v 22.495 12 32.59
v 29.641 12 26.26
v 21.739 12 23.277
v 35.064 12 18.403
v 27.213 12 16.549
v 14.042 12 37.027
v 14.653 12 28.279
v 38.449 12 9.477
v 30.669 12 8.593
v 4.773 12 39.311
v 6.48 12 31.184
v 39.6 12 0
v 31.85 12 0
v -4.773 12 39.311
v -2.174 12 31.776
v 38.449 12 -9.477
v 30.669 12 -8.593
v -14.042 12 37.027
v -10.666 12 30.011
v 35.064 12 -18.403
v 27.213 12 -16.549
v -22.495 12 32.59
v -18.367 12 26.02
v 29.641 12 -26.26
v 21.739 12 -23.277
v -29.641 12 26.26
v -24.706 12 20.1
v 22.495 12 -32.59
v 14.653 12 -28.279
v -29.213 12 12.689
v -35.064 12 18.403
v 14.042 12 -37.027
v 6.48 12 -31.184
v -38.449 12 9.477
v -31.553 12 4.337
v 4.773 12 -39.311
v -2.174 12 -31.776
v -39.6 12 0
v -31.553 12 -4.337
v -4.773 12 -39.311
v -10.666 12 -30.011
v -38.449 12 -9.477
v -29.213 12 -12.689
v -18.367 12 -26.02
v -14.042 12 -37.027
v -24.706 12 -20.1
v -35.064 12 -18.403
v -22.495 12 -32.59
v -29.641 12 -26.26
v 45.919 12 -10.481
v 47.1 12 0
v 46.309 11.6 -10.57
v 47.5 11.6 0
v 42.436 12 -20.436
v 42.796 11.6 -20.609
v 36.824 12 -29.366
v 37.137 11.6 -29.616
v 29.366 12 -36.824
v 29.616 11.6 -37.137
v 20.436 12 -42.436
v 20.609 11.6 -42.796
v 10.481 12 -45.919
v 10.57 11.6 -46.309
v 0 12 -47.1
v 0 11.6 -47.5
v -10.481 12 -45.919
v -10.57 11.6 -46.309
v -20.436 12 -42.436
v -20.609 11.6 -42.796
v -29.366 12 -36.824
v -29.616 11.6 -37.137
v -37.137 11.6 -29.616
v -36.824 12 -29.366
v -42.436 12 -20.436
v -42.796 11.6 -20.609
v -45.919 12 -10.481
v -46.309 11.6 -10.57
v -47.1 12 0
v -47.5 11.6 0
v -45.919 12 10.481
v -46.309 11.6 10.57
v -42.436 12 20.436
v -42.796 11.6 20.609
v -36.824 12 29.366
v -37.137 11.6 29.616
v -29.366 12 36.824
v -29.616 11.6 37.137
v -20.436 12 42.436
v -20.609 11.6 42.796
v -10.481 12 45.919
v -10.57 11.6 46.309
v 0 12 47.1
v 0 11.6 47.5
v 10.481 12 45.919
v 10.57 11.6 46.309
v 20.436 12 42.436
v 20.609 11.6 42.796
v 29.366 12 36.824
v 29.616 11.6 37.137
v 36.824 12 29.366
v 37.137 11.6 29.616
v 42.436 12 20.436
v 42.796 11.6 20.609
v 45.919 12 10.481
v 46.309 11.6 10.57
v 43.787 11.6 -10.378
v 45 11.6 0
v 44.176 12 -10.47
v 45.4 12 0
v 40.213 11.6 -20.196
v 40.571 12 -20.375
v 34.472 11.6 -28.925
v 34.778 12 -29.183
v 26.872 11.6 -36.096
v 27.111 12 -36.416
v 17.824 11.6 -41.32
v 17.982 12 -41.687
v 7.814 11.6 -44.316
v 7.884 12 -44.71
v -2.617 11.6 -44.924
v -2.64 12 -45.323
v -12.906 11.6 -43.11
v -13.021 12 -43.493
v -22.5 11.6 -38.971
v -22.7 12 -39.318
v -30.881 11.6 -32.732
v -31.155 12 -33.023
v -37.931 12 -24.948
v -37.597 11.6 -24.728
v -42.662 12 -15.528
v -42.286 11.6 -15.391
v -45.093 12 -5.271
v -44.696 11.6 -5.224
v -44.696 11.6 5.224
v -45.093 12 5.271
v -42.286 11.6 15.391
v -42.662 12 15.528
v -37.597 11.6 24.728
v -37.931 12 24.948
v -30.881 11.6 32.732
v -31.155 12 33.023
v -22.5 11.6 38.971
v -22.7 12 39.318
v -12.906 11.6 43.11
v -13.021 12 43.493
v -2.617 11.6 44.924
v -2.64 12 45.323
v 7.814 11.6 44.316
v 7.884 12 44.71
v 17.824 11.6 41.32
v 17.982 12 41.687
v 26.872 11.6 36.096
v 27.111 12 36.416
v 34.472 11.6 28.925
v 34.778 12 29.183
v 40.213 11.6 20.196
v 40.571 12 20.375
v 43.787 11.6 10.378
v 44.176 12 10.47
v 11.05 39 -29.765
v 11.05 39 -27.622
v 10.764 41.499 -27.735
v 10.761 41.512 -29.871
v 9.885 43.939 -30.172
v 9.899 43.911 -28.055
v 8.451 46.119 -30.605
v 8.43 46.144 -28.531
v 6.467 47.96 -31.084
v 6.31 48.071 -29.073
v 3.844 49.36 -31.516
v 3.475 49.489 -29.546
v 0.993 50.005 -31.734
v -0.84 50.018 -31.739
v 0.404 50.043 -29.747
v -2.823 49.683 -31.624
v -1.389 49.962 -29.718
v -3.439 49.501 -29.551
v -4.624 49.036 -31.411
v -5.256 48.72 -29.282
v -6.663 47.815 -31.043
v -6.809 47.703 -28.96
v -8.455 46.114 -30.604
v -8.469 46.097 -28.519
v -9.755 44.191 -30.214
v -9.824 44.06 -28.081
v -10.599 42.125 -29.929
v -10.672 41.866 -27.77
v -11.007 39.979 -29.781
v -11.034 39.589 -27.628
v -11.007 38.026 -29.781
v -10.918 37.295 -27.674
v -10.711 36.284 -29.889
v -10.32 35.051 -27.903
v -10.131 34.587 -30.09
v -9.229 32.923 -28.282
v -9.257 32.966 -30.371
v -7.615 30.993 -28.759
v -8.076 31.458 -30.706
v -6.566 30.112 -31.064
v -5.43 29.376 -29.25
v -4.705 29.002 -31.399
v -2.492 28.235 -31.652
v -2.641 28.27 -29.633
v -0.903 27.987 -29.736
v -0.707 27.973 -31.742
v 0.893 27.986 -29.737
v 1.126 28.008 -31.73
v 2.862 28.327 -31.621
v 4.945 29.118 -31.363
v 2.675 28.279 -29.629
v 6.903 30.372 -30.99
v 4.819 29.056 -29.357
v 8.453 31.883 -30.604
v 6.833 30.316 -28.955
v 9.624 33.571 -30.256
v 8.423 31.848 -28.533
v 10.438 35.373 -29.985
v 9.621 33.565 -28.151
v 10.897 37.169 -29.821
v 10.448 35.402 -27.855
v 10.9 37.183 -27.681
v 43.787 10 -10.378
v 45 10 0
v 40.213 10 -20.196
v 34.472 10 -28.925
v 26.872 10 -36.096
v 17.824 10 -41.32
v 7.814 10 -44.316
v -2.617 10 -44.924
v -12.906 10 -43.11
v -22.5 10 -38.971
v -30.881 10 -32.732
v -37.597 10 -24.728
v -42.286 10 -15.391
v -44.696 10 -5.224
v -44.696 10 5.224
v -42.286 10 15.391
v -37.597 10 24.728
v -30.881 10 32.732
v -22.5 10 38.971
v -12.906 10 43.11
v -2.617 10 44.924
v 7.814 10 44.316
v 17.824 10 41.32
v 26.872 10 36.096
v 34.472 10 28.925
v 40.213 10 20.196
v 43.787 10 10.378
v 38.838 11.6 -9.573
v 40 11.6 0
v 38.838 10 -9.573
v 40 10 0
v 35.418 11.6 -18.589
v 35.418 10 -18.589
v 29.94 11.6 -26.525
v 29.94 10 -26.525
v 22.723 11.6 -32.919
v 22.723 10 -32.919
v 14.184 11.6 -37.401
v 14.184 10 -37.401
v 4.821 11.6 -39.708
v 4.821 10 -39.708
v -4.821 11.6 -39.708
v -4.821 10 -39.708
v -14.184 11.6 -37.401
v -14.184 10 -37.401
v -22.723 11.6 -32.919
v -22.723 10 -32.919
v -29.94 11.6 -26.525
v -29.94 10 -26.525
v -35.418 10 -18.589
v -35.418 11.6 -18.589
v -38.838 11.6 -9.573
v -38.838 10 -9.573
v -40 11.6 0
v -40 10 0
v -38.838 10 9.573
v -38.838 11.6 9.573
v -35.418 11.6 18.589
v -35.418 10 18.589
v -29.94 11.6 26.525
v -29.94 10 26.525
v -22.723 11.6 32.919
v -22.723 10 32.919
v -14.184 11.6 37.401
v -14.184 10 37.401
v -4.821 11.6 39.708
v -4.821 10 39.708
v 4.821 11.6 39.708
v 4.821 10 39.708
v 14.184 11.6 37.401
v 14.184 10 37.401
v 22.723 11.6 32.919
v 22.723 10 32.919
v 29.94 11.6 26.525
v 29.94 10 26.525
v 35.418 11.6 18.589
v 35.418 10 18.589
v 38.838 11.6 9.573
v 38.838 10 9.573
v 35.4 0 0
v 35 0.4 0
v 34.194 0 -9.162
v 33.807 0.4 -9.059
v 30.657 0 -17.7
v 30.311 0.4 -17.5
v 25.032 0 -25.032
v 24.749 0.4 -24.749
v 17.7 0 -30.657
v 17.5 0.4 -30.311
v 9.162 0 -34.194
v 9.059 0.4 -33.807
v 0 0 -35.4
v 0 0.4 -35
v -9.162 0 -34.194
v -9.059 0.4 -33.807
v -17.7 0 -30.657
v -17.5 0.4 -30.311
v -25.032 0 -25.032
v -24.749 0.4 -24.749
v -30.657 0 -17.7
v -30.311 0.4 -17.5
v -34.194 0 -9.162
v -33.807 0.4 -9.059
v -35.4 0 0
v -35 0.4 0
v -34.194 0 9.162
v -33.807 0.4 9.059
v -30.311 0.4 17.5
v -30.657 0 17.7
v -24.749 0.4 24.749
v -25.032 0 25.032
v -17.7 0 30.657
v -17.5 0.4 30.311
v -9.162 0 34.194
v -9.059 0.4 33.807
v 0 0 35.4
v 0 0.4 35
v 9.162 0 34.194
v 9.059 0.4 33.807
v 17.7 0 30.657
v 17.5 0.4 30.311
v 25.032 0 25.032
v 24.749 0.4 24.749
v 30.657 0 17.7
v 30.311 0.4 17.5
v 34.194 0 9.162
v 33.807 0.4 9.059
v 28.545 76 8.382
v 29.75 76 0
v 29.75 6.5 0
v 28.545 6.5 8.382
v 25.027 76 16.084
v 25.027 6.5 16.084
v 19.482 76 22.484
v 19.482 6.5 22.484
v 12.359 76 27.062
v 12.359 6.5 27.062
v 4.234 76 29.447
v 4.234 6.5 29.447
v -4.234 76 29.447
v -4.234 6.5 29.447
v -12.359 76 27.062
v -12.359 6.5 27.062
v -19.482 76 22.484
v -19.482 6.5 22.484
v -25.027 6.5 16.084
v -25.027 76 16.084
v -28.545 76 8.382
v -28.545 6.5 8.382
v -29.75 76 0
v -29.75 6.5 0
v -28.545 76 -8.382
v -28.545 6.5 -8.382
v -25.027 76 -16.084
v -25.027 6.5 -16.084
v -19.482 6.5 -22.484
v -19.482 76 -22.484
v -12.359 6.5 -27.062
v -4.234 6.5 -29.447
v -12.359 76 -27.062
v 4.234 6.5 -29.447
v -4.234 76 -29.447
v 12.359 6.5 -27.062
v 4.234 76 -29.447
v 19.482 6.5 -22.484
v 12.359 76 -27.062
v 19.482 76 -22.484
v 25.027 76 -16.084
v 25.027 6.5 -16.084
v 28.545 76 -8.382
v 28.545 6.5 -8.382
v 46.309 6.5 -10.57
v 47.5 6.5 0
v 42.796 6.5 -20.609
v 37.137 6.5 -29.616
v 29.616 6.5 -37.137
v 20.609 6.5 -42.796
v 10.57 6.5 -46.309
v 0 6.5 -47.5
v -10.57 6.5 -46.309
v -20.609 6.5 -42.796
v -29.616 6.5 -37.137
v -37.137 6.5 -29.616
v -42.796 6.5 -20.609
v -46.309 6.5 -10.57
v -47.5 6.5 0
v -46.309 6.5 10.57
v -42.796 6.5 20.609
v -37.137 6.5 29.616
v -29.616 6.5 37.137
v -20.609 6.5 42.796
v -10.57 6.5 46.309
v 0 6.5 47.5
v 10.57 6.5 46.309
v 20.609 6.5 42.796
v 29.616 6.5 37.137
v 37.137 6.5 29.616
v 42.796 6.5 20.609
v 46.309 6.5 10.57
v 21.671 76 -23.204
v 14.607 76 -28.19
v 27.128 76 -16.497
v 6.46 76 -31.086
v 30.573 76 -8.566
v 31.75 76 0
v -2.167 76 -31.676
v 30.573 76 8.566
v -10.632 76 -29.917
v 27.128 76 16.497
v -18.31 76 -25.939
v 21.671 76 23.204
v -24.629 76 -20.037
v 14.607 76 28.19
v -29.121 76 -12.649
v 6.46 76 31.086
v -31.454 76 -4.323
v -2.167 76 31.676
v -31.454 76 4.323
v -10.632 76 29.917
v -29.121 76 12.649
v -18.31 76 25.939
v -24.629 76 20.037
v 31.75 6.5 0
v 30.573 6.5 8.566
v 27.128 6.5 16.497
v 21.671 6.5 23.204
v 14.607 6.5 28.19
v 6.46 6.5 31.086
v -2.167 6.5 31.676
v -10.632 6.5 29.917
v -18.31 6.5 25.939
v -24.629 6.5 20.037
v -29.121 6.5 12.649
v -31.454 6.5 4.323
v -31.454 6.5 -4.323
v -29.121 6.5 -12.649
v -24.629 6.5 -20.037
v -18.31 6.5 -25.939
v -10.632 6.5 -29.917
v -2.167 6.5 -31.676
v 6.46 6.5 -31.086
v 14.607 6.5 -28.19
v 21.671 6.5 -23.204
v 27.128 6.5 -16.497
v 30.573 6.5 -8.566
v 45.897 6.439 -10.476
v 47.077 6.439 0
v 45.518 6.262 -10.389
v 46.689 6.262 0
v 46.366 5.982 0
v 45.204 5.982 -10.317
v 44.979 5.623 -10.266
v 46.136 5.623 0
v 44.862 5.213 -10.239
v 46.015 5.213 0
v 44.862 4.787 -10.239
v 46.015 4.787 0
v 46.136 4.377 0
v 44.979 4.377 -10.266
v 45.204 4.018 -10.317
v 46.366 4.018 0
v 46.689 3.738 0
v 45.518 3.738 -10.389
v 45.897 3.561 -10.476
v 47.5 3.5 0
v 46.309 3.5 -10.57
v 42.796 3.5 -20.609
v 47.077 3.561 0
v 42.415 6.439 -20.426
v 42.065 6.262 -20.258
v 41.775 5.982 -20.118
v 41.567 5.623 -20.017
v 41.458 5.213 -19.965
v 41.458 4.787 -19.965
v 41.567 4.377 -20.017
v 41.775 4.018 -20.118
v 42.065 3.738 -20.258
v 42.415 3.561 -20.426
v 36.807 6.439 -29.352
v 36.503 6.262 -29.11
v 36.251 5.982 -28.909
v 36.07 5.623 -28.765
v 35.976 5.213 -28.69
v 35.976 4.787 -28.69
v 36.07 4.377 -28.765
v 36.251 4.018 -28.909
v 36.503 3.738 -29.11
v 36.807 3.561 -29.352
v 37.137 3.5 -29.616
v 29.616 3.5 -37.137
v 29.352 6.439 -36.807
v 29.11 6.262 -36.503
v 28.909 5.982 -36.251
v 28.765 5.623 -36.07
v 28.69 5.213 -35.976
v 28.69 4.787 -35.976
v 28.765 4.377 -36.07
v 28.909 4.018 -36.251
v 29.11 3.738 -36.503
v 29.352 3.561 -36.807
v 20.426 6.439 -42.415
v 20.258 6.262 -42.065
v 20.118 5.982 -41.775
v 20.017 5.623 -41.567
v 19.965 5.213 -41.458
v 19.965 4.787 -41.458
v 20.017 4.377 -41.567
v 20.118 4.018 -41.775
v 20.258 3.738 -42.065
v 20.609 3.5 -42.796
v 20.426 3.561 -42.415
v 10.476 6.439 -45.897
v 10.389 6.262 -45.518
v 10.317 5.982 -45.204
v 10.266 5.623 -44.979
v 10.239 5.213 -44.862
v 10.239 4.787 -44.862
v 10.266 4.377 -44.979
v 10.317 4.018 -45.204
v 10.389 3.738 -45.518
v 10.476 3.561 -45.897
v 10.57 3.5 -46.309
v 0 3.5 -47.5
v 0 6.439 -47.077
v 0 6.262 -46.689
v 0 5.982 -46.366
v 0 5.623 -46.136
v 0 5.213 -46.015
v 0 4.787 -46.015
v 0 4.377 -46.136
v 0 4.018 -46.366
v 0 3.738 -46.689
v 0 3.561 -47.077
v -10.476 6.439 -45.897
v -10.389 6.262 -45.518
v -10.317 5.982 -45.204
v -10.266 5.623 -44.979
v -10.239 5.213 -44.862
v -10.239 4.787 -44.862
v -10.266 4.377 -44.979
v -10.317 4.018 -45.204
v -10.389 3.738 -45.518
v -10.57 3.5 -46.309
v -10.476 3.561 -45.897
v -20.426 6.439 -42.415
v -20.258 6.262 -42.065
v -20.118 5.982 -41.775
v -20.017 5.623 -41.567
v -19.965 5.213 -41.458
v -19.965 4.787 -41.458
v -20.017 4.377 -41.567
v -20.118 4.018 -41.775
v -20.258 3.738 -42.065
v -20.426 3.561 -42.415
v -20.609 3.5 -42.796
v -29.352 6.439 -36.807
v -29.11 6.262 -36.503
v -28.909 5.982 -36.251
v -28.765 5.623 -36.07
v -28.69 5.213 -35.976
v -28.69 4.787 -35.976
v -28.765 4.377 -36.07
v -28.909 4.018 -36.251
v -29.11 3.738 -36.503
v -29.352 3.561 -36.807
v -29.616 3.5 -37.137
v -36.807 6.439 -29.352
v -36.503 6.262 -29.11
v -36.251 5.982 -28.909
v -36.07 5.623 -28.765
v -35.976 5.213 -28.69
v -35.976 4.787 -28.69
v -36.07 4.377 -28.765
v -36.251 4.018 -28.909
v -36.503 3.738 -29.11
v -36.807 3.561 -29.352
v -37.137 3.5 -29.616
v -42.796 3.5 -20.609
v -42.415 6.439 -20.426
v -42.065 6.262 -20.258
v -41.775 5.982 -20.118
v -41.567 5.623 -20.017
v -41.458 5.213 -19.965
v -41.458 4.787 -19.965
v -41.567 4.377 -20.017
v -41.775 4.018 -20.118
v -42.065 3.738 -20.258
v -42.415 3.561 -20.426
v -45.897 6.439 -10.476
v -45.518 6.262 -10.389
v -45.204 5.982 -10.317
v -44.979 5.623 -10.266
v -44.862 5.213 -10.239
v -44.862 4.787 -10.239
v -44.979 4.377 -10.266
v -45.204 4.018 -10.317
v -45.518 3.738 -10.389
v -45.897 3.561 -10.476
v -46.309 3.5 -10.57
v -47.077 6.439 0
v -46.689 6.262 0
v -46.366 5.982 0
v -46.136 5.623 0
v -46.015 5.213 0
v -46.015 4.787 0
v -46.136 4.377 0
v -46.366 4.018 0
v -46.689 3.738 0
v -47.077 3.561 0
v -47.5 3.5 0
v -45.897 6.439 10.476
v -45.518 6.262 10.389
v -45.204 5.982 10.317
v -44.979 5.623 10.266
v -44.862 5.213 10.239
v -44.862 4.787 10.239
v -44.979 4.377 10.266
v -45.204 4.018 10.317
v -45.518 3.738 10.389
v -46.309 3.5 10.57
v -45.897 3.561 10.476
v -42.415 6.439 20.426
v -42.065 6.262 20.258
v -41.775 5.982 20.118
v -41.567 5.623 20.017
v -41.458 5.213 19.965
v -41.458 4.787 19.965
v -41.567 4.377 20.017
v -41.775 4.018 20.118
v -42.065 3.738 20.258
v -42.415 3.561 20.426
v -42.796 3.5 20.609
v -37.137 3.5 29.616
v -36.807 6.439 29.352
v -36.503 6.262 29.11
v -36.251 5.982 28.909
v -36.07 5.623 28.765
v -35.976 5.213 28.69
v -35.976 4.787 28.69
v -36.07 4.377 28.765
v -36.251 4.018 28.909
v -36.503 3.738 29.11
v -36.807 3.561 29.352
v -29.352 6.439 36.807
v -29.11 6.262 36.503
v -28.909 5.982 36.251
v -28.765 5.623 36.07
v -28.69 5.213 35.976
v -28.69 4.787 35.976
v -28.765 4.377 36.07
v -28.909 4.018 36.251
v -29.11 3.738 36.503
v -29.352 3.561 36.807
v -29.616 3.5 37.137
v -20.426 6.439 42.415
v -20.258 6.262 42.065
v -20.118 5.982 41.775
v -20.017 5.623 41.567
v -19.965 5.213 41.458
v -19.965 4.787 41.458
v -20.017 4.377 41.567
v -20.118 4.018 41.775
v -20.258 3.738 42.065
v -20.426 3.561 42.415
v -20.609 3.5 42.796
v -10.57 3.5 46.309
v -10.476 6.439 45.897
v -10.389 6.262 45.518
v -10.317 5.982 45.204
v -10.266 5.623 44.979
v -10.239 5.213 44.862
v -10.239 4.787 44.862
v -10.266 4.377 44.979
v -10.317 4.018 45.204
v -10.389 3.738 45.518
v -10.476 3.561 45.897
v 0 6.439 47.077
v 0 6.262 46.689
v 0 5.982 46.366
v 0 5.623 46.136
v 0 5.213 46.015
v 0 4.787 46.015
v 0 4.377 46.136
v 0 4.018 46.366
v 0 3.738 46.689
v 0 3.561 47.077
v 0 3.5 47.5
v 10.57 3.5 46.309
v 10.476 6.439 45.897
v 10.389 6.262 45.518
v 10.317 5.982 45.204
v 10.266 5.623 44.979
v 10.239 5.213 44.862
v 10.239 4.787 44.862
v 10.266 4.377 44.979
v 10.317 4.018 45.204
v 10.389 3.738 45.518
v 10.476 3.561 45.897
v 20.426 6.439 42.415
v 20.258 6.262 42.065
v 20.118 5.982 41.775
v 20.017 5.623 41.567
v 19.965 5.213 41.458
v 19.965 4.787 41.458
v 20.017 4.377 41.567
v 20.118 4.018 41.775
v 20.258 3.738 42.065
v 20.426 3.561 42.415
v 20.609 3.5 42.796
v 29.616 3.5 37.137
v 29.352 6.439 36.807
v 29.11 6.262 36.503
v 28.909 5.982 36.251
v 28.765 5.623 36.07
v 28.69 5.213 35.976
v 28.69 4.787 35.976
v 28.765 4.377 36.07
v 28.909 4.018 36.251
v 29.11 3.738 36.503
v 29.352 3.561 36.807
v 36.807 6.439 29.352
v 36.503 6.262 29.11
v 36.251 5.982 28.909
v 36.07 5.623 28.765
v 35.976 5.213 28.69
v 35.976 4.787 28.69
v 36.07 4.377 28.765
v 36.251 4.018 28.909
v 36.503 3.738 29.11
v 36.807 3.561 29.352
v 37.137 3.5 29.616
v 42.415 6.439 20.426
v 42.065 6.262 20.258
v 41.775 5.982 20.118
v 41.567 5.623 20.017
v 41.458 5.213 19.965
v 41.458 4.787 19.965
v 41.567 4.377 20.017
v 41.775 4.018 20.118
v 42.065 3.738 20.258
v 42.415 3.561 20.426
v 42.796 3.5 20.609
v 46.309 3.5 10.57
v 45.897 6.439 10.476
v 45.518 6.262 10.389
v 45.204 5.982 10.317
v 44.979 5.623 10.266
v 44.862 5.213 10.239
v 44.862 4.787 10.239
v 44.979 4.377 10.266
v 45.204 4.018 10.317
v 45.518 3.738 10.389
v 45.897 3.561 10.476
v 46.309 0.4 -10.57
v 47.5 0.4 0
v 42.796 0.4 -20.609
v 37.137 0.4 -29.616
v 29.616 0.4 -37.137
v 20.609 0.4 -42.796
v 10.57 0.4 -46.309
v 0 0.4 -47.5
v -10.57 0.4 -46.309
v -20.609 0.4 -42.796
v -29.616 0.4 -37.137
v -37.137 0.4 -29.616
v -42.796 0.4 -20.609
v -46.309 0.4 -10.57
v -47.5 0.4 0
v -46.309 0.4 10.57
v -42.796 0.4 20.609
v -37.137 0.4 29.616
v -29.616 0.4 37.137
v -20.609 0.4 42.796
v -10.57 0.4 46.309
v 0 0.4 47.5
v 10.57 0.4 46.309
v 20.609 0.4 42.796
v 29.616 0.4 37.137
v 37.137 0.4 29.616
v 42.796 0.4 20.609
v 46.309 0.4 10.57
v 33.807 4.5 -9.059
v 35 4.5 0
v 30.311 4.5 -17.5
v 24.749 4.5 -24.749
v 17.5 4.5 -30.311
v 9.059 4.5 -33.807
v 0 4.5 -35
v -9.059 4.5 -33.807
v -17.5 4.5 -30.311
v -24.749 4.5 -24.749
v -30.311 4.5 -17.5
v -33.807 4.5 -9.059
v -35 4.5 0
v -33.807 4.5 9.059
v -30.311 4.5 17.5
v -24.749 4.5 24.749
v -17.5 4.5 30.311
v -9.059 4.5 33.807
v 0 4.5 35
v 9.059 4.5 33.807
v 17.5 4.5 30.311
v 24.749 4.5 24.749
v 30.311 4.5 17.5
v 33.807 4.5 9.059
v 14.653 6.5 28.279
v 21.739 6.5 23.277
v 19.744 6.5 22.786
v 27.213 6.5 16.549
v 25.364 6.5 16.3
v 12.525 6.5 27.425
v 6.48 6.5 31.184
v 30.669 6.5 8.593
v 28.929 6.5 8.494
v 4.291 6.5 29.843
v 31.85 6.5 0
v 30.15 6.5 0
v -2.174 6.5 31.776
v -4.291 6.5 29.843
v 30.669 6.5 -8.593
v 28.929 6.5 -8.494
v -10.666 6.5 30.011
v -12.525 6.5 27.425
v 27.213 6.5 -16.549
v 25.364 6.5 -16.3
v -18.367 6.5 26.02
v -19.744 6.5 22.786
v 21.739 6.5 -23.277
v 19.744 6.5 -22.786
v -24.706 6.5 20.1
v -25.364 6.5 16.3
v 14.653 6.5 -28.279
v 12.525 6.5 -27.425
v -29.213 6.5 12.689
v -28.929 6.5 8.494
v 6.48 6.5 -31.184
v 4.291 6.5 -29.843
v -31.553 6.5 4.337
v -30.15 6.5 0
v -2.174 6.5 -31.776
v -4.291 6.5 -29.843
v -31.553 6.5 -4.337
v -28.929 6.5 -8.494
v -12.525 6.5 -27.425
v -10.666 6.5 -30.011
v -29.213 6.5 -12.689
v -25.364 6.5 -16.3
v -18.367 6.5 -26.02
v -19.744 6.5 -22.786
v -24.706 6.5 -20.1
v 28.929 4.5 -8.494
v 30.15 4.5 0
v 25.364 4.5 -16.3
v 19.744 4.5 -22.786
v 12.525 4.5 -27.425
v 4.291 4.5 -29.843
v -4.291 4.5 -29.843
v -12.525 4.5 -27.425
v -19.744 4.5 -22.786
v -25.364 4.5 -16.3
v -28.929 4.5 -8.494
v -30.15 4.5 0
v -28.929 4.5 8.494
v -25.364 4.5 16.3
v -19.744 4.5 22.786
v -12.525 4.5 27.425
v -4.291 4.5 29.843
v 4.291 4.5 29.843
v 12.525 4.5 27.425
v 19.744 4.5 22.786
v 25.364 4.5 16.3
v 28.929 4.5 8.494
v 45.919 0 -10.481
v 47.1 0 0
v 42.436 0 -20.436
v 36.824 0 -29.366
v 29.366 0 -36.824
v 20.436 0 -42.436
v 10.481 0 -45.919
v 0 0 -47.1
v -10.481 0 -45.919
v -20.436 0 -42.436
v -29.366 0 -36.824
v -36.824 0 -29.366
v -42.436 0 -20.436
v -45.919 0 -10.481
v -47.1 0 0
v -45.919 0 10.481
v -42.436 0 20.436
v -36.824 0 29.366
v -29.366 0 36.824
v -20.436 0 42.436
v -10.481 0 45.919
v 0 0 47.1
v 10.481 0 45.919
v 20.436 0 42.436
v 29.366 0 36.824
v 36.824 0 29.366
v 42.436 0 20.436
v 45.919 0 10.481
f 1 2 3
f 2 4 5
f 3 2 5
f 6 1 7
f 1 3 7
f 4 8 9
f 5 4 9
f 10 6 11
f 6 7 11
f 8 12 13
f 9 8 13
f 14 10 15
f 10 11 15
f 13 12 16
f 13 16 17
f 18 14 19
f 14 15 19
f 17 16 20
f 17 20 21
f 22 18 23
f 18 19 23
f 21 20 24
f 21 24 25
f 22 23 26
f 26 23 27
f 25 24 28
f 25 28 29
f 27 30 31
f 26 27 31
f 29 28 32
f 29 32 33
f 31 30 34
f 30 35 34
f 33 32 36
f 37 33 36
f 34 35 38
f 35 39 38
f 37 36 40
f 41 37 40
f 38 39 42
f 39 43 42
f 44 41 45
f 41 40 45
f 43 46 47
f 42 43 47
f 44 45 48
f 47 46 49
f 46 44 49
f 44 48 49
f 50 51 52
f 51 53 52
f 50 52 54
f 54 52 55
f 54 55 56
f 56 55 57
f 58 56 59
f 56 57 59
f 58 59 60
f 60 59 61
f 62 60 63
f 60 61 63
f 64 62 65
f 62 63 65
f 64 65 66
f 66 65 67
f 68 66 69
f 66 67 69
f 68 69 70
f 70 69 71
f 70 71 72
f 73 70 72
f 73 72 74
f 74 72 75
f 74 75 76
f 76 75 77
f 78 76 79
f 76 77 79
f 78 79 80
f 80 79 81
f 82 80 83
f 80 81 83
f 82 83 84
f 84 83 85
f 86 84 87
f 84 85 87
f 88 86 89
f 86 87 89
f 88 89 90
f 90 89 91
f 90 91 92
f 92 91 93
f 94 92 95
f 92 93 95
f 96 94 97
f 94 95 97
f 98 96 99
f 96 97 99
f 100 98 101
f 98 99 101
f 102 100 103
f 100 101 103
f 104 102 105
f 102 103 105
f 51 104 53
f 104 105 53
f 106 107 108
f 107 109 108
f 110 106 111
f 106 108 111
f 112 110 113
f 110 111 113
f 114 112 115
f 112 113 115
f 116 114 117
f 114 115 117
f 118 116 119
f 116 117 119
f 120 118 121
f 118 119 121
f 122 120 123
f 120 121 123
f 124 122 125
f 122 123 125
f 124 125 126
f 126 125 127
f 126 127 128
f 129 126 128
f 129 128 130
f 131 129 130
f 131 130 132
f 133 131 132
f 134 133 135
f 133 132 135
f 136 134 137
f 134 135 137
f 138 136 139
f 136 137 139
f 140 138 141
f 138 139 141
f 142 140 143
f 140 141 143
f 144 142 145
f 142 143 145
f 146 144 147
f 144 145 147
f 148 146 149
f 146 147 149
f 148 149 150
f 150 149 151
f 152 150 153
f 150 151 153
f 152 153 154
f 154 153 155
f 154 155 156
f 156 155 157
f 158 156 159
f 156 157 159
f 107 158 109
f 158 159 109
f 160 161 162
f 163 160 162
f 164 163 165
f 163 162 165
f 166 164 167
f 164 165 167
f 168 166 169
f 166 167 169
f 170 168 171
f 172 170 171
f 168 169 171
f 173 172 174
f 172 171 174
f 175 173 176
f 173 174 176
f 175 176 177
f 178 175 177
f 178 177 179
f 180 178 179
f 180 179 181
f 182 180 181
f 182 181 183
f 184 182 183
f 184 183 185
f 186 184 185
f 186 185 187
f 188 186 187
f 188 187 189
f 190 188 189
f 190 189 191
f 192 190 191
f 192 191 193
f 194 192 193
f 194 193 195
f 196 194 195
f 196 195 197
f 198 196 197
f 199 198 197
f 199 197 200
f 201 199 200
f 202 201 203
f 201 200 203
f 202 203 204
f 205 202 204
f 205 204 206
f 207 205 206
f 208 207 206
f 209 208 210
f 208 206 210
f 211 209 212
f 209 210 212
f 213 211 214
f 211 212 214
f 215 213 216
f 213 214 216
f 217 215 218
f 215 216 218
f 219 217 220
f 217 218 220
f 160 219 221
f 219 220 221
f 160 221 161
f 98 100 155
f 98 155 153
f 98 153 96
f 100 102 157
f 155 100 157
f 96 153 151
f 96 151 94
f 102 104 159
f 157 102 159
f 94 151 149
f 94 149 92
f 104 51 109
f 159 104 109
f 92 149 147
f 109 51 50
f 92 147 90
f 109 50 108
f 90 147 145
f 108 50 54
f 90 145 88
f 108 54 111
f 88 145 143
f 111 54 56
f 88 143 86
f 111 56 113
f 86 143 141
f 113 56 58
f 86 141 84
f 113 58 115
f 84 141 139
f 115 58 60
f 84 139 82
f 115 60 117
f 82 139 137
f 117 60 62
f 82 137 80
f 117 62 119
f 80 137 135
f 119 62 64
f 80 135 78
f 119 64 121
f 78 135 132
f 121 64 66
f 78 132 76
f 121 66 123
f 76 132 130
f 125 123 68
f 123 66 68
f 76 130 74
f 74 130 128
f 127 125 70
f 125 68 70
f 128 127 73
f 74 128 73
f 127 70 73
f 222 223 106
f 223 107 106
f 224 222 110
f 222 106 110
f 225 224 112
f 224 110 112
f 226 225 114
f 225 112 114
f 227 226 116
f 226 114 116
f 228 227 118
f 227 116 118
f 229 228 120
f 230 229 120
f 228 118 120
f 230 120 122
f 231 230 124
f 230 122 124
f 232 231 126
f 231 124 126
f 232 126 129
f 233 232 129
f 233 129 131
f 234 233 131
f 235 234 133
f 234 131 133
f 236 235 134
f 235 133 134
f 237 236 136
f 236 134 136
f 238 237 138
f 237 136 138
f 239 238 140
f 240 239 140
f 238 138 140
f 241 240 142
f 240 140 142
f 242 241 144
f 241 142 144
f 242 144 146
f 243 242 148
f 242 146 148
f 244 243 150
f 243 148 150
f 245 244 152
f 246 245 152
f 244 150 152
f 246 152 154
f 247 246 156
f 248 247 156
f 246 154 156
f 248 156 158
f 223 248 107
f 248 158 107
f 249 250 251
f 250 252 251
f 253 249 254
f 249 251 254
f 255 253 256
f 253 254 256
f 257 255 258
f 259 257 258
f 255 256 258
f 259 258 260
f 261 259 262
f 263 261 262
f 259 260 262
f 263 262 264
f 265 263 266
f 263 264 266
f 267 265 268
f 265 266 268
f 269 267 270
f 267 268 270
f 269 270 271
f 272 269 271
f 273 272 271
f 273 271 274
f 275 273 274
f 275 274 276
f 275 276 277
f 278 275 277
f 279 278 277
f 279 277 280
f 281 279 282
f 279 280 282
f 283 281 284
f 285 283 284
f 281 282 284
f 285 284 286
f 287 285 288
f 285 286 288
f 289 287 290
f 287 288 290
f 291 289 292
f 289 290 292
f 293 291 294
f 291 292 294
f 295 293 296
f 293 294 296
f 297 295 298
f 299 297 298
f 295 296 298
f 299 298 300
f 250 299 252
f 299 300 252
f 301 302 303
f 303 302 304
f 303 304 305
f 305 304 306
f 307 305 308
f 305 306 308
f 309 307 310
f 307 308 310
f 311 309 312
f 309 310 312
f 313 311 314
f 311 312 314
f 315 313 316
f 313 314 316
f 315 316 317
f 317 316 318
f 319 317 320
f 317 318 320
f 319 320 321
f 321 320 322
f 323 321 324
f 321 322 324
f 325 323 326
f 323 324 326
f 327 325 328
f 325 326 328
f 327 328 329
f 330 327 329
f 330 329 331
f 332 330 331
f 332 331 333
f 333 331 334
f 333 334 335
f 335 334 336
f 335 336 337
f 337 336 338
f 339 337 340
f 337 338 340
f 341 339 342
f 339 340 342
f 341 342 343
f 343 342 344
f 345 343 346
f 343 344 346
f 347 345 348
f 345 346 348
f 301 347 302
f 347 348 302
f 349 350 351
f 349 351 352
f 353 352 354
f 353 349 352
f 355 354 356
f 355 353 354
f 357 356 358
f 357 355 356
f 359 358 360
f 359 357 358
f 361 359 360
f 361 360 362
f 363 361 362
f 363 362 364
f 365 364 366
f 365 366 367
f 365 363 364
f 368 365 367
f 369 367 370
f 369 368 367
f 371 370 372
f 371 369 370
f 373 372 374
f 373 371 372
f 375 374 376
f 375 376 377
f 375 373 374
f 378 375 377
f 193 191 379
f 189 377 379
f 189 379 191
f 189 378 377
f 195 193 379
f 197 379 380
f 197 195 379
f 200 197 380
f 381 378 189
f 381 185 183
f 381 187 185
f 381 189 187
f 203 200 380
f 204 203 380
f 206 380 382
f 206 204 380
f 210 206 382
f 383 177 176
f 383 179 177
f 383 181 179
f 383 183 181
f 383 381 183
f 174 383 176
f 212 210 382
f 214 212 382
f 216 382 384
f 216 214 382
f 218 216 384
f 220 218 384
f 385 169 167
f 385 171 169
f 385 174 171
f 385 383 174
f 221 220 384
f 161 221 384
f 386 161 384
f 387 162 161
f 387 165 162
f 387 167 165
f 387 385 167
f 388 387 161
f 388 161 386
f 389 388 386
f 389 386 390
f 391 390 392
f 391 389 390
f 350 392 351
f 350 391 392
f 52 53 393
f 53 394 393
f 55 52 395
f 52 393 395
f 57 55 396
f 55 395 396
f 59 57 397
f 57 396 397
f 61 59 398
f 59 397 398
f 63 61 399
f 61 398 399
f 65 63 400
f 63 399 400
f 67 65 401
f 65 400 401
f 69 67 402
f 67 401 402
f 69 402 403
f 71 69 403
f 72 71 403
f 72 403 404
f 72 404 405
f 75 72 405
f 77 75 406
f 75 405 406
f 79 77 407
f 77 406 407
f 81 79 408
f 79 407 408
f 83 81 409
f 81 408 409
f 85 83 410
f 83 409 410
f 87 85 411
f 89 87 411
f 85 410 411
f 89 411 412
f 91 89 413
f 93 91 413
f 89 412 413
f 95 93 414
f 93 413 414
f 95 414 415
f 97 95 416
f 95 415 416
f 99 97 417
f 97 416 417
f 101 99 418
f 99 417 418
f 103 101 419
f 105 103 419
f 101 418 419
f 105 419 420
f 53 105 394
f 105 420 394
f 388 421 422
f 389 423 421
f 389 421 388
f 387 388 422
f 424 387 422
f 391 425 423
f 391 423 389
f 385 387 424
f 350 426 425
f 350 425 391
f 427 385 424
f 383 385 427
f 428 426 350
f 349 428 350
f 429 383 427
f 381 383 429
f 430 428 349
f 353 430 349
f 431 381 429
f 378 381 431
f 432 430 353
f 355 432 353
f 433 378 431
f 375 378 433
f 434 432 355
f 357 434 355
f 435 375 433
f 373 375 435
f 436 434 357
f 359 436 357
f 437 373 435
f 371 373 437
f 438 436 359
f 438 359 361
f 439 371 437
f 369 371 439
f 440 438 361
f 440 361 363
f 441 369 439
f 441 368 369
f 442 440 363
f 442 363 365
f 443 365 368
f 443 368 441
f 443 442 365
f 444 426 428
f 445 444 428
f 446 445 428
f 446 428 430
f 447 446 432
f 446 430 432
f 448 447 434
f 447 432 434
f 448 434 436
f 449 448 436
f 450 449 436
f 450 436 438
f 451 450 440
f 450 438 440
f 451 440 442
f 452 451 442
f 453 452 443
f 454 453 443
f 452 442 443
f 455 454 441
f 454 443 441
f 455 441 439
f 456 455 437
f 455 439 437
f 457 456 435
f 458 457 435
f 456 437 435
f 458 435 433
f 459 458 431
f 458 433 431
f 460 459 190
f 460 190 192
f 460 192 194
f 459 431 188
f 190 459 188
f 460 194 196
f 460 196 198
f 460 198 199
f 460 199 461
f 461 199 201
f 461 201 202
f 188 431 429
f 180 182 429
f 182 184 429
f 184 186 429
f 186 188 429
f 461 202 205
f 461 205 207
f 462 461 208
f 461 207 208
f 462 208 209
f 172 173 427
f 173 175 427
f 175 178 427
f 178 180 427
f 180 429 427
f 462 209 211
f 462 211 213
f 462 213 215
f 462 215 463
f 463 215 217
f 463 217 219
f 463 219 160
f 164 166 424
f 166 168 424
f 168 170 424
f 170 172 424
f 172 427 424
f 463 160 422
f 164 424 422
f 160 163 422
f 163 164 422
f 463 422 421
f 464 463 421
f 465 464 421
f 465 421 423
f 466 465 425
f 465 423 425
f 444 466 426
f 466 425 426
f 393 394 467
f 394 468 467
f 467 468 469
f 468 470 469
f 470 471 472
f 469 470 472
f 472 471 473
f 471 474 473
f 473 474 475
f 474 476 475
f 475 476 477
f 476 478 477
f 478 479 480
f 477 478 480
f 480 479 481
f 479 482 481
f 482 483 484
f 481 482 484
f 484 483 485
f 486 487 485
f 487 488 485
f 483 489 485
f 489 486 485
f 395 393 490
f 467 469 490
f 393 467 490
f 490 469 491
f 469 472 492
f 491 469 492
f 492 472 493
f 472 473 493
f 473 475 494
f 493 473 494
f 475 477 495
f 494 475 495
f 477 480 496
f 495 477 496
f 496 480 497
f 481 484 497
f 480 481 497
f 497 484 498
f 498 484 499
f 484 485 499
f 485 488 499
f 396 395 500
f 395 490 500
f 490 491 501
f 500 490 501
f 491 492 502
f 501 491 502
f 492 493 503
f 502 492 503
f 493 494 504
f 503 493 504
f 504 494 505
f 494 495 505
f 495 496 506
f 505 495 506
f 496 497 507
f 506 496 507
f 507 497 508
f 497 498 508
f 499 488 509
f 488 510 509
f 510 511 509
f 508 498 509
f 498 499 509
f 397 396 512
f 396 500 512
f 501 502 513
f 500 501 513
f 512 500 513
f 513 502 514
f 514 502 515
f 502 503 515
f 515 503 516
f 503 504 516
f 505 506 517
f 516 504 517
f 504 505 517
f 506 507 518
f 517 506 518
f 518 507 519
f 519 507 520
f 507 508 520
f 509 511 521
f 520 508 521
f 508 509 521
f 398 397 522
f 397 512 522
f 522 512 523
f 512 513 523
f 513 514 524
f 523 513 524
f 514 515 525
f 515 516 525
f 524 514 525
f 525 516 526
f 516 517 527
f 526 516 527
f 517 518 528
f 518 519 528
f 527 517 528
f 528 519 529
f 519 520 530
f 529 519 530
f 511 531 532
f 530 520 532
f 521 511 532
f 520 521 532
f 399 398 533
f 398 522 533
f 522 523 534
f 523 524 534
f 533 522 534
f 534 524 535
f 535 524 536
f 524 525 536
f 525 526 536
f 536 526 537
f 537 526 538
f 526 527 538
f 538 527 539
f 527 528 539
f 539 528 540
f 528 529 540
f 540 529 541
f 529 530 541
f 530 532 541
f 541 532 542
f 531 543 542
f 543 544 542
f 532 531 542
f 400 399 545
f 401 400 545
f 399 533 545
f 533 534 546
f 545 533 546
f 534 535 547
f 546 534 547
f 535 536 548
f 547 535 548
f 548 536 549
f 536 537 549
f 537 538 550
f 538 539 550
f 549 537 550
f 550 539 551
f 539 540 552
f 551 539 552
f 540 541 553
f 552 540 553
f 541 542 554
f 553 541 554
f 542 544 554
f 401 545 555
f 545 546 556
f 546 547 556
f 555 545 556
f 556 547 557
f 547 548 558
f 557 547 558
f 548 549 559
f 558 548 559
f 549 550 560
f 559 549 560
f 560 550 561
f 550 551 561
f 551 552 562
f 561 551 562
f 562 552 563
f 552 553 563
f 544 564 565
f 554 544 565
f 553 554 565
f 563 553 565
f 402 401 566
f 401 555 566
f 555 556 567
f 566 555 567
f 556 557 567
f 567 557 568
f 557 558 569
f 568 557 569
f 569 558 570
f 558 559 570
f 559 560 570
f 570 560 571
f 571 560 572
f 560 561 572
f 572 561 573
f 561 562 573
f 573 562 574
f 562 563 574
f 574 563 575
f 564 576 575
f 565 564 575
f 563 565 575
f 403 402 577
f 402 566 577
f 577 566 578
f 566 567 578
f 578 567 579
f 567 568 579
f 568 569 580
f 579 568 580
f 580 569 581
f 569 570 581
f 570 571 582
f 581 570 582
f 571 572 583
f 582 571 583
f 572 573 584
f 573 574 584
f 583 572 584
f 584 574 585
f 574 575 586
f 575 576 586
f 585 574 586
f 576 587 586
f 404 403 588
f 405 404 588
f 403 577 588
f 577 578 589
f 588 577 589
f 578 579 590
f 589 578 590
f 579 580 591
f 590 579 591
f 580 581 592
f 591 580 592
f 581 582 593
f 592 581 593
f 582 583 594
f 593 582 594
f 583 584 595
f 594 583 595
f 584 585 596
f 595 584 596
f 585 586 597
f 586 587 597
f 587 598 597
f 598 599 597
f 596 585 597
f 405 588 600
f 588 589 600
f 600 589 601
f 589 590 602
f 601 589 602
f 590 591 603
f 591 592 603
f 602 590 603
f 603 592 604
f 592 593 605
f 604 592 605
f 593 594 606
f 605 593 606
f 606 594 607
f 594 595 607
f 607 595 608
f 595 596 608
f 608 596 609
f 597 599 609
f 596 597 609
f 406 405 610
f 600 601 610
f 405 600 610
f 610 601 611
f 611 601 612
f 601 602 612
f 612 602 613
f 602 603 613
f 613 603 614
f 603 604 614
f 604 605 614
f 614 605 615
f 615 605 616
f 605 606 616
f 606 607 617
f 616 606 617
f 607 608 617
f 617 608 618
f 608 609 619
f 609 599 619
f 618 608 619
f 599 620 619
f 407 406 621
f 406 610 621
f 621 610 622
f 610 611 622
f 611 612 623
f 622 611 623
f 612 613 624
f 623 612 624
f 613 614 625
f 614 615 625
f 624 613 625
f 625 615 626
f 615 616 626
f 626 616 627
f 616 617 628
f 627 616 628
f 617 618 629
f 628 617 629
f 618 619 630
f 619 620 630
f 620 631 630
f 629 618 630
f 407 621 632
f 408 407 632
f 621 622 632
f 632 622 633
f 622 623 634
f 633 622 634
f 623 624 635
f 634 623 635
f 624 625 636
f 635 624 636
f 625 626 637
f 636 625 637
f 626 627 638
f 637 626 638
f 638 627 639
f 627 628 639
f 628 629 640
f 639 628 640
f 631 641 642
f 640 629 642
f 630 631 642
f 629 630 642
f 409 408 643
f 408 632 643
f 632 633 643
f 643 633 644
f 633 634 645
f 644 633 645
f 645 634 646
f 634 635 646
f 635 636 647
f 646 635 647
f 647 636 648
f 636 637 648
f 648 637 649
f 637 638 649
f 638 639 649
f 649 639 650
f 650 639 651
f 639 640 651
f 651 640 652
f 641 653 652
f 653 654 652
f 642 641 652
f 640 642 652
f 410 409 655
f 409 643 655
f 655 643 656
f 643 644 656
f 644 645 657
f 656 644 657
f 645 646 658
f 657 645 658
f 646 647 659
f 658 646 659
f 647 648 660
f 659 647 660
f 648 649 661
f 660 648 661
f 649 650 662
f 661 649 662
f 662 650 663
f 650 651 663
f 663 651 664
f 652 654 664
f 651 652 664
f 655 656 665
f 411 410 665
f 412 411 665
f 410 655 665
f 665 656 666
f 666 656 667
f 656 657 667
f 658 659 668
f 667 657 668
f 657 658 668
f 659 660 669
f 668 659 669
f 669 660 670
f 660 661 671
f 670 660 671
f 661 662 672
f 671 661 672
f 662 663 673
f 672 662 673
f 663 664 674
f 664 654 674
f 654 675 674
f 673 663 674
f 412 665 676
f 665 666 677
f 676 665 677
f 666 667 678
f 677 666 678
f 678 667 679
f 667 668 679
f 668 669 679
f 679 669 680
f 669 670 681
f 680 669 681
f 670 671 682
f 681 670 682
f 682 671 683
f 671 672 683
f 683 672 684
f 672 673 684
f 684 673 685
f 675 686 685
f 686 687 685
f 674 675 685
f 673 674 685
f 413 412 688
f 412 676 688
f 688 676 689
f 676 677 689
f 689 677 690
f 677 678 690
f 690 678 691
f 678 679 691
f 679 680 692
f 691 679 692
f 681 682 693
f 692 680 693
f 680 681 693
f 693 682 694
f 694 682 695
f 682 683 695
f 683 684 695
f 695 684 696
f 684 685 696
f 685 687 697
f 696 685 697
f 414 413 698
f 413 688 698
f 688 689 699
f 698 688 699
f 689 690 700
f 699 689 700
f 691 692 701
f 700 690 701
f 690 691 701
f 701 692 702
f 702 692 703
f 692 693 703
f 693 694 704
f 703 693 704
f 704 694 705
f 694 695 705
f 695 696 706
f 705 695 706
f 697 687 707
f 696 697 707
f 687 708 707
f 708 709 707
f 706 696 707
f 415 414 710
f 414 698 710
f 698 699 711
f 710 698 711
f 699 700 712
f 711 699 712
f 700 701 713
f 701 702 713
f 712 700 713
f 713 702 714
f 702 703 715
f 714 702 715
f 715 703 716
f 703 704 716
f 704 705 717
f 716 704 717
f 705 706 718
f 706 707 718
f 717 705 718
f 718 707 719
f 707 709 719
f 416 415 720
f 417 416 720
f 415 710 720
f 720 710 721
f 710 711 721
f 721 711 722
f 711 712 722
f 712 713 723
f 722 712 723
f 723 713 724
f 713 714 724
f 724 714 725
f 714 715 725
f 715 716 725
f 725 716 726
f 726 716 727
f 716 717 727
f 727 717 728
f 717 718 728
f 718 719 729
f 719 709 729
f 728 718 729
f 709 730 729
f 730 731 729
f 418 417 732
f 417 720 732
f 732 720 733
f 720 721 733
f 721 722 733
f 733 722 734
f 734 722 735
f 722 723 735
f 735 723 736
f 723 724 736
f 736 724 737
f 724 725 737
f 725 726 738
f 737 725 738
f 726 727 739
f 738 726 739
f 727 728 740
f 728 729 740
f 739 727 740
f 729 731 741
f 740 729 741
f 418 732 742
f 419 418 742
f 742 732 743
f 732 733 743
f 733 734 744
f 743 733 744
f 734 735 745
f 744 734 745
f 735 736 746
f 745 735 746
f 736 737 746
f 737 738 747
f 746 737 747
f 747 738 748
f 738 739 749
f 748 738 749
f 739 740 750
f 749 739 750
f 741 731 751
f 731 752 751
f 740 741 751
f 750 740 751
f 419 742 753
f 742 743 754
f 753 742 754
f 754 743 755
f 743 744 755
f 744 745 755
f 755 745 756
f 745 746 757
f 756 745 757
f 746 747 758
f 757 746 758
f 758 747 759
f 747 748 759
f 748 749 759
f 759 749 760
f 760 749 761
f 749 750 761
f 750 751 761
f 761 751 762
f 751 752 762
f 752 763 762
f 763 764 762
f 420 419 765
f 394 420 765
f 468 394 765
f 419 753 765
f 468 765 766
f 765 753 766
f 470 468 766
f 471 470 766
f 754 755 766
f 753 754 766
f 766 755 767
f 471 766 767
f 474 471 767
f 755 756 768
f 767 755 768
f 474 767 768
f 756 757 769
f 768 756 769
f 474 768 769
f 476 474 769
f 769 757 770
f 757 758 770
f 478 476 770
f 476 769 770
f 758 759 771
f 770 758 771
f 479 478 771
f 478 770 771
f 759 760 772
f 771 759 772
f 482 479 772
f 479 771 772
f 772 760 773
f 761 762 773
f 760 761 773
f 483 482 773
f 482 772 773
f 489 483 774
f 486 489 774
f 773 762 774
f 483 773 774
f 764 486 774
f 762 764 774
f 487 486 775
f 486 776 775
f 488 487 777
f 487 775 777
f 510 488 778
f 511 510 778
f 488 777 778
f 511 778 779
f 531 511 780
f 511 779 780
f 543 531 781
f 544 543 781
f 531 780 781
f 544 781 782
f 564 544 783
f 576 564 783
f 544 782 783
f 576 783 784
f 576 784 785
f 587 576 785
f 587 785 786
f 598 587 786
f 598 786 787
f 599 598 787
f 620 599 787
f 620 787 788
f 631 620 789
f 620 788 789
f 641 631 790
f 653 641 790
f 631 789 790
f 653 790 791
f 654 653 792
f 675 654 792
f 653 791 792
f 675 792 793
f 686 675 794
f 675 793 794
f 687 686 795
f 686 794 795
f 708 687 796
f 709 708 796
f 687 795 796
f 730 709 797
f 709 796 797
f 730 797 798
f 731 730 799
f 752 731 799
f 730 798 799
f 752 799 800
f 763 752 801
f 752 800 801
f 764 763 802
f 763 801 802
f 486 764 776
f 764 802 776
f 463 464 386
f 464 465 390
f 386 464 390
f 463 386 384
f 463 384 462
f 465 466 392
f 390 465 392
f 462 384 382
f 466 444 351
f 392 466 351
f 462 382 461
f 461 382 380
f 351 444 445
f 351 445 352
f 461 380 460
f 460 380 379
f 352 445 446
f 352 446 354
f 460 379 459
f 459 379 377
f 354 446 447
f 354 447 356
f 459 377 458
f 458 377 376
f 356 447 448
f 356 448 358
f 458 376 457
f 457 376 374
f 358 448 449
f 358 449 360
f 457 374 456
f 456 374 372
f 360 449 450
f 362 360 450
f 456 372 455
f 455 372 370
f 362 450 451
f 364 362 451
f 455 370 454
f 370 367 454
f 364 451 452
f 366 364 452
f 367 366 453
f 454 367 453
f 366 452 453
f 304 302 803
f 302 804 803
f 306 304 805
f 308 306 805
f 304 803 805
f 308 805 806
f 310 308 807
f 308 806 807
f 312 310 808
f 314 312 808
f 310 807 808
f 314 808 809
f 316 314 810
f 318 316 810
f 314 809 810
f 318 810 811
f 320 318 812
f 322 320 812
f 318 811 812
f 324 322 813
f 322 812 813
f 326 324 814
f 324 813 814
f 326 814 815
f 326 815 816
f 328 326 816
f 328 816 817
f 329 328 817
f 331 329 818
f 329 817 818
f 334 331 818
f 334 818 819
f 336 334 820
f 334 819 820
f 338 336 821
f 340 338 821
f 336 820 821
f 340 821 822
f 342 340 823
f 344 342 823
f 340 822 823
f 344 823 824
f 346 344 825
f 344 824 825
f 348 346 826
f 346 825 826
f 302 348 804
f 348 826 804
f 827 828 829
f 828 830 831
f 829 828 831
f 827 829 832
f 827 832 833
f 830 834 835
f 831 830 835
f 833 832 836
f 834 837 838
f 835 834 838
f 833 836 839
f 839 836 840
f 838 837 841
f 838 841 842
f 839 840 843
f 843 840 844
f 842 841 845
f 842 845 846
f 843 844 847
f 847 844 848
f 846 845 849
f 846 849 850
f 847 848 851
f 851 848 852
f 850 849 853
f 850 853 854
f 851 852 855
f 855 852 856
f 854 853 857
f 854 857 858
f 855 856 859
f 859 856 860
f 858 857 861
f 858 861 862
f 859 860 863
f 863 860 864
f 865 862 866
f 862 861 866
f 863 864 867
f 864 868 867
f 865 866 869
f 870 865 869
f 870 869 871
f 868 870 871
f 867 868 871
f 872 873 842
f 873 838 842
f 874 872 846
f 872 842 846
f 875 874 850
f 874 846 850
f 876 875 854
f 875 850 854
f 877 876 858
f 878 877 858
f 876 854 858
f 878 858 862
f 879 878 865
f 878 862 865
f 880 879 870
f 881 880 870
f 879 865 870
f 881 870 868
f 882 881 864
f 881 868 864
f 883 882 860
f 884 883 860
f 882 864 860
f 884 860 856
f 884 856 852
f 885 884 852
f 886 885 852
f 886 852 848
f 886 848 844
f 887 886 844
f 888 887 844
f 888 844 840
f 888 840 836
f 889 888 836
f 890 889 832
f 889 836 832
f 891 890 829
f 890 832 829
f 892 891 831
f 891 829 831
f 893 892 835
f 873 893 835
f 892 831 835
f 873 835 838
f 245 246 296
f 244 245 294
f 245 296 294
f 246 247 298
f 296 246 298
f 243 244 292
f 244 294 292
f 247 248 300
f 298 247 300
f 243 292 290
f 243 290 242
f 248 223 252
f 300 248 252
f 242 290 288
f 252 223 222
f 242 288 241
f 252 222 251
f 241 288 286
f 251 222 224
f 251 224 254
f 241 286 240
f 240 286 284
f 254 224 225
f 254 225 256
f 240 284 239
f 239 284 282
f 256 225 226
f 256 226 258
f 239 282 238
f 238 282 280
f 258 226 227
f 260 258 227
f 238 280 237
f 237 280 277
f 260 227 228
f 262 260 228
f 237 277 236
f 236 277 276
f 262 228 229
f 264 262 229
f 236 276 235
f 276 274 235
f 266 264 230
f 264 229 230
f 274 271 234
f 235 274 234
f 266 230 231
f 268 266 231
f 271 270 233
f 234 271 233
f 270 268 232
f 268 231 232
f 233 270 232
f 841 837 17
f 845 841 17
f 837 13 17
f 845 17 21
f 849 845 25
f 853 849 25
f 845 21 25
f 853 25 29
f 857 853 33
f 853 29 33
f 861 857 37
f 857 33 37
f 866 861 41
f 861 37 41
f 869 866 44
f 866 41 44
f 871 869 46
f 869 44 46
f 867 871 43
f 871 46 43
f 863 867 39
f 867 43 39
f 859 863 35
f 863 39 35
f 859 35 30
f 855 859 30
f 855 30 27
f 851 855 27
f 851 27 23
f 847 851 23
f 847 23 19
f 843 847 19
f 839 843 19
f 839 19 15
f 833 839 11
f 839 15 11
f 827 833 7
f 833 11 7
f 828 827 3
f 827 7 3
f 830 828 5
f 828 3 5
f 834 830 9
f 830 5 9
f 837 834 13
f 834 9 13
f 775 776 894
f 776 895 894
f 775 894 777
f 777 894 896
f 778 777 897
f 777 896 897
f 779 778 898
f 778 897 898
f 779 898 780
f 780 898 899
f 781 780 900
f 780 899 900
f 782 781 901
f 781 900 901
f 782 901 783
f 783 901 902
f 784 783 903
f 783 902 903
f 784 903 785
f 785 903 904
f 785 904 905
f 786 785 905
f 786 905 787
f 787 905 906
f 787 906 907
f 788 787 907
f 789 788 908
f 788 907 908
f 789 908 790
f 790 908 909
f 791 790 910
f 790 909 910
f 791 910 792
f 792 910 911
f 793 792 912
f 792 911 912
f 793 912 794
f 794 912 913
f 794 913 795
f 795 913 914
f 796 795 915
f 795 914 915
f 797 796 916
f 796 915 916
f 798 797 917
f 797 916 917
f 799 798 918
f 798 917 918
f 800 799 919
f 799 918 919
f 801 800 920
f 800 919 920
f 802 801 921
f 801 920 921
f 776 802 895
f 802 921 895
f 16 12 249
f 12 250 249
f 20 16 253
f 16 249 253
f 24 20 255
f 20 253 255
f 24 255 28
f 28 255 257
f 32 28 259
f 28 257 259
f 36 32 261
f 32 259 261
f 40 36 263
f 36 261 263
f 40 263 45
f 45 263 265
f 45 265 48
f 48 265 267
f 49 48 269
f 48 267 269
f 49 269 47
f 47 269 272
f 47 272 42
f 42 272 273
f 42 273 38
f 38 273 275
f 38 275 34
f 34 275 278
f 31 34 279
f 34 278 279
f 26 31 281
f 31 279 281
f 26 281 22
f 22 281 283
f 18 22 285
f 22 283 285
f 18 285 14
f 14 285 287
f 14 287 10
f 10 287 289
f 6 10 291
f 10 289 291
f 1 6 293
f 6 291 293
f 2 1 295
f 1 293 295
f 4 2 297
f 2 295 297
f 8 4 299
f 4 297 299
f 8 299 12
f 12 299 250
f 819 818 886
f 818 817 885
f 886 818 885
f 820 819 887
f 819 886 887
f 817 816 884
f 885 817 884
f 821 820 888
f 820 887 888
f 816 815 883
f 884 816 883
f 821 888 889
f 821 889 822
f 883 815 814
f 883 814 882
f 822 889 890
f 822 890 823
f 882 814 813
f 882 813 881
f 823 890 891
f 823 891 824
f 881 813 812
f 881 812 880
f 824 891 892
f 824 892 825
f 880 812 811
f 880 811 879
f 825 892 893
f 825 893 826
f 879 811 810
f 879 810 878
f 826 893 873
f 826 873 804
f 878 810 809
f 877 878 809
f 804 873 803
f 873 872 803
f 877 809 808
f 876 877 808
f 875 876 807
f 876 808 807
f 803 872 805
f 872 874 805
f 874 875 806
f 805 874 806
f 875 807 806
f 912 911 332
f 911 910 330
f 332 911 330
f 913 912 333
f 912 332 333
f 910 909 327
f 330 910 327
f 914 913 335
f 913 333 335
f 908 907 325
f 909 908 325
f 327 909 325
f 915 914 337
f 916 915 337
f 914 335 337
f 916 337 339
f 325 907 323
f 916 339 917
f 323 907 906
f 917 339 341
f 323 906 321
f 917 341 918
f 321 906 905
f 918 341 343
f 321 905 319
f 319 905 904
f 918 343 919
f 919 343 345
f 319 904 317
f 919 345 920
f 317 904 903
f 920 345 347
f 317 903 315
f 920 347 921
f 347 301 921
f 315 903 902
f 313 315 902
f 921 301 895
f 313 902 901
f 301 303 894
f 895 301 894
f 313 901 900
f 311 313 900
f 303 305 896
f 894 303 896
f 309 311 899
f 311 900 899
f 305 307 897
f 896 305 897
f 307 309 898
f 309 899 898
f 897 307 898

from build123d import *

# Parameters (mm, degrees)
SKETCH7_W          = 2
SKETCH7_H          = 69.5
SKETCH9_R          = 11.05
CUT_EXTRUDE1_DEPTH = 48.5


with BuildPart() as part:
    # Sketch5 → ISO-63K (revolve)
    with BuildSketch(Plane(origin=(0, 0, 0), x_dir=(-1, 0, 0), z_dir=(0, 0, -1))):
        with BuildLine():
            Line((-47.1, 12), (-47.5, 11.6))
            Line((-47.5, 11.6), (-47.5, 6.5))
            ThreePointArc((-47.5, 6.5), (-46, 5), (-47.5, 3.5))
            Line((-47.5, 3.5), (-47.5, 0.4))
            Line((-47.5, 0.4), (-47.1, 0))
            Line((-47.1, 0), (-35.4, 0))
            Line((-35.4, 0), (-35, 0.4))
            Line((-35, 0.4), (-35, 4.5))
            Line((-35, 4.5), (-30.15, 4.5))
            Line((-30.15, 4.5), (-30.15, 6.5))
            Line((-30.15, 6.5), (-31.85, 6.5))
            Line((-31.85, 6.5), (-31.85, 12))
            Line((-31.85, 12), (-39.6, 12))
            Line((-39.6, 12), (-40, 11.6))
            Line((-40, 11.6), (-40, 10))
            Line((-40, 10), (-45, 10))
            Line((-45, 10), (-45, 11.6))
            Line((-45, 11.6), (-45.4, 12))
            Line((-45.4, 12), (-47.1, 12))
        make_face()
    revolve(axis=Axis((0, 0, 0), (0, 1, 0)))


with BuildPart() as body_2:
    # Sketch7 → Half-Nipple (revolve)
    with BuildSketch(Plane.XY):
        with Locations((30.75, 41.25)):
            Rectangle(SKETCH7_W, SKETCH7_H)
    revolve(axis=Axis((0, 88, 0), (0, -1, 0)))

    # Sketch9 → Cut-Extrude1 (cut, through all)
    with BuildSketch(Plane.XY):
        with Locations((0, 39)):
            Circle(SKETCH9_R)
    extrude(amount=-CUT_EXTRUDE1_DEPTH, mode=Mode.SUBTRACT)


solid = Compound([part.part, body_2.part])
